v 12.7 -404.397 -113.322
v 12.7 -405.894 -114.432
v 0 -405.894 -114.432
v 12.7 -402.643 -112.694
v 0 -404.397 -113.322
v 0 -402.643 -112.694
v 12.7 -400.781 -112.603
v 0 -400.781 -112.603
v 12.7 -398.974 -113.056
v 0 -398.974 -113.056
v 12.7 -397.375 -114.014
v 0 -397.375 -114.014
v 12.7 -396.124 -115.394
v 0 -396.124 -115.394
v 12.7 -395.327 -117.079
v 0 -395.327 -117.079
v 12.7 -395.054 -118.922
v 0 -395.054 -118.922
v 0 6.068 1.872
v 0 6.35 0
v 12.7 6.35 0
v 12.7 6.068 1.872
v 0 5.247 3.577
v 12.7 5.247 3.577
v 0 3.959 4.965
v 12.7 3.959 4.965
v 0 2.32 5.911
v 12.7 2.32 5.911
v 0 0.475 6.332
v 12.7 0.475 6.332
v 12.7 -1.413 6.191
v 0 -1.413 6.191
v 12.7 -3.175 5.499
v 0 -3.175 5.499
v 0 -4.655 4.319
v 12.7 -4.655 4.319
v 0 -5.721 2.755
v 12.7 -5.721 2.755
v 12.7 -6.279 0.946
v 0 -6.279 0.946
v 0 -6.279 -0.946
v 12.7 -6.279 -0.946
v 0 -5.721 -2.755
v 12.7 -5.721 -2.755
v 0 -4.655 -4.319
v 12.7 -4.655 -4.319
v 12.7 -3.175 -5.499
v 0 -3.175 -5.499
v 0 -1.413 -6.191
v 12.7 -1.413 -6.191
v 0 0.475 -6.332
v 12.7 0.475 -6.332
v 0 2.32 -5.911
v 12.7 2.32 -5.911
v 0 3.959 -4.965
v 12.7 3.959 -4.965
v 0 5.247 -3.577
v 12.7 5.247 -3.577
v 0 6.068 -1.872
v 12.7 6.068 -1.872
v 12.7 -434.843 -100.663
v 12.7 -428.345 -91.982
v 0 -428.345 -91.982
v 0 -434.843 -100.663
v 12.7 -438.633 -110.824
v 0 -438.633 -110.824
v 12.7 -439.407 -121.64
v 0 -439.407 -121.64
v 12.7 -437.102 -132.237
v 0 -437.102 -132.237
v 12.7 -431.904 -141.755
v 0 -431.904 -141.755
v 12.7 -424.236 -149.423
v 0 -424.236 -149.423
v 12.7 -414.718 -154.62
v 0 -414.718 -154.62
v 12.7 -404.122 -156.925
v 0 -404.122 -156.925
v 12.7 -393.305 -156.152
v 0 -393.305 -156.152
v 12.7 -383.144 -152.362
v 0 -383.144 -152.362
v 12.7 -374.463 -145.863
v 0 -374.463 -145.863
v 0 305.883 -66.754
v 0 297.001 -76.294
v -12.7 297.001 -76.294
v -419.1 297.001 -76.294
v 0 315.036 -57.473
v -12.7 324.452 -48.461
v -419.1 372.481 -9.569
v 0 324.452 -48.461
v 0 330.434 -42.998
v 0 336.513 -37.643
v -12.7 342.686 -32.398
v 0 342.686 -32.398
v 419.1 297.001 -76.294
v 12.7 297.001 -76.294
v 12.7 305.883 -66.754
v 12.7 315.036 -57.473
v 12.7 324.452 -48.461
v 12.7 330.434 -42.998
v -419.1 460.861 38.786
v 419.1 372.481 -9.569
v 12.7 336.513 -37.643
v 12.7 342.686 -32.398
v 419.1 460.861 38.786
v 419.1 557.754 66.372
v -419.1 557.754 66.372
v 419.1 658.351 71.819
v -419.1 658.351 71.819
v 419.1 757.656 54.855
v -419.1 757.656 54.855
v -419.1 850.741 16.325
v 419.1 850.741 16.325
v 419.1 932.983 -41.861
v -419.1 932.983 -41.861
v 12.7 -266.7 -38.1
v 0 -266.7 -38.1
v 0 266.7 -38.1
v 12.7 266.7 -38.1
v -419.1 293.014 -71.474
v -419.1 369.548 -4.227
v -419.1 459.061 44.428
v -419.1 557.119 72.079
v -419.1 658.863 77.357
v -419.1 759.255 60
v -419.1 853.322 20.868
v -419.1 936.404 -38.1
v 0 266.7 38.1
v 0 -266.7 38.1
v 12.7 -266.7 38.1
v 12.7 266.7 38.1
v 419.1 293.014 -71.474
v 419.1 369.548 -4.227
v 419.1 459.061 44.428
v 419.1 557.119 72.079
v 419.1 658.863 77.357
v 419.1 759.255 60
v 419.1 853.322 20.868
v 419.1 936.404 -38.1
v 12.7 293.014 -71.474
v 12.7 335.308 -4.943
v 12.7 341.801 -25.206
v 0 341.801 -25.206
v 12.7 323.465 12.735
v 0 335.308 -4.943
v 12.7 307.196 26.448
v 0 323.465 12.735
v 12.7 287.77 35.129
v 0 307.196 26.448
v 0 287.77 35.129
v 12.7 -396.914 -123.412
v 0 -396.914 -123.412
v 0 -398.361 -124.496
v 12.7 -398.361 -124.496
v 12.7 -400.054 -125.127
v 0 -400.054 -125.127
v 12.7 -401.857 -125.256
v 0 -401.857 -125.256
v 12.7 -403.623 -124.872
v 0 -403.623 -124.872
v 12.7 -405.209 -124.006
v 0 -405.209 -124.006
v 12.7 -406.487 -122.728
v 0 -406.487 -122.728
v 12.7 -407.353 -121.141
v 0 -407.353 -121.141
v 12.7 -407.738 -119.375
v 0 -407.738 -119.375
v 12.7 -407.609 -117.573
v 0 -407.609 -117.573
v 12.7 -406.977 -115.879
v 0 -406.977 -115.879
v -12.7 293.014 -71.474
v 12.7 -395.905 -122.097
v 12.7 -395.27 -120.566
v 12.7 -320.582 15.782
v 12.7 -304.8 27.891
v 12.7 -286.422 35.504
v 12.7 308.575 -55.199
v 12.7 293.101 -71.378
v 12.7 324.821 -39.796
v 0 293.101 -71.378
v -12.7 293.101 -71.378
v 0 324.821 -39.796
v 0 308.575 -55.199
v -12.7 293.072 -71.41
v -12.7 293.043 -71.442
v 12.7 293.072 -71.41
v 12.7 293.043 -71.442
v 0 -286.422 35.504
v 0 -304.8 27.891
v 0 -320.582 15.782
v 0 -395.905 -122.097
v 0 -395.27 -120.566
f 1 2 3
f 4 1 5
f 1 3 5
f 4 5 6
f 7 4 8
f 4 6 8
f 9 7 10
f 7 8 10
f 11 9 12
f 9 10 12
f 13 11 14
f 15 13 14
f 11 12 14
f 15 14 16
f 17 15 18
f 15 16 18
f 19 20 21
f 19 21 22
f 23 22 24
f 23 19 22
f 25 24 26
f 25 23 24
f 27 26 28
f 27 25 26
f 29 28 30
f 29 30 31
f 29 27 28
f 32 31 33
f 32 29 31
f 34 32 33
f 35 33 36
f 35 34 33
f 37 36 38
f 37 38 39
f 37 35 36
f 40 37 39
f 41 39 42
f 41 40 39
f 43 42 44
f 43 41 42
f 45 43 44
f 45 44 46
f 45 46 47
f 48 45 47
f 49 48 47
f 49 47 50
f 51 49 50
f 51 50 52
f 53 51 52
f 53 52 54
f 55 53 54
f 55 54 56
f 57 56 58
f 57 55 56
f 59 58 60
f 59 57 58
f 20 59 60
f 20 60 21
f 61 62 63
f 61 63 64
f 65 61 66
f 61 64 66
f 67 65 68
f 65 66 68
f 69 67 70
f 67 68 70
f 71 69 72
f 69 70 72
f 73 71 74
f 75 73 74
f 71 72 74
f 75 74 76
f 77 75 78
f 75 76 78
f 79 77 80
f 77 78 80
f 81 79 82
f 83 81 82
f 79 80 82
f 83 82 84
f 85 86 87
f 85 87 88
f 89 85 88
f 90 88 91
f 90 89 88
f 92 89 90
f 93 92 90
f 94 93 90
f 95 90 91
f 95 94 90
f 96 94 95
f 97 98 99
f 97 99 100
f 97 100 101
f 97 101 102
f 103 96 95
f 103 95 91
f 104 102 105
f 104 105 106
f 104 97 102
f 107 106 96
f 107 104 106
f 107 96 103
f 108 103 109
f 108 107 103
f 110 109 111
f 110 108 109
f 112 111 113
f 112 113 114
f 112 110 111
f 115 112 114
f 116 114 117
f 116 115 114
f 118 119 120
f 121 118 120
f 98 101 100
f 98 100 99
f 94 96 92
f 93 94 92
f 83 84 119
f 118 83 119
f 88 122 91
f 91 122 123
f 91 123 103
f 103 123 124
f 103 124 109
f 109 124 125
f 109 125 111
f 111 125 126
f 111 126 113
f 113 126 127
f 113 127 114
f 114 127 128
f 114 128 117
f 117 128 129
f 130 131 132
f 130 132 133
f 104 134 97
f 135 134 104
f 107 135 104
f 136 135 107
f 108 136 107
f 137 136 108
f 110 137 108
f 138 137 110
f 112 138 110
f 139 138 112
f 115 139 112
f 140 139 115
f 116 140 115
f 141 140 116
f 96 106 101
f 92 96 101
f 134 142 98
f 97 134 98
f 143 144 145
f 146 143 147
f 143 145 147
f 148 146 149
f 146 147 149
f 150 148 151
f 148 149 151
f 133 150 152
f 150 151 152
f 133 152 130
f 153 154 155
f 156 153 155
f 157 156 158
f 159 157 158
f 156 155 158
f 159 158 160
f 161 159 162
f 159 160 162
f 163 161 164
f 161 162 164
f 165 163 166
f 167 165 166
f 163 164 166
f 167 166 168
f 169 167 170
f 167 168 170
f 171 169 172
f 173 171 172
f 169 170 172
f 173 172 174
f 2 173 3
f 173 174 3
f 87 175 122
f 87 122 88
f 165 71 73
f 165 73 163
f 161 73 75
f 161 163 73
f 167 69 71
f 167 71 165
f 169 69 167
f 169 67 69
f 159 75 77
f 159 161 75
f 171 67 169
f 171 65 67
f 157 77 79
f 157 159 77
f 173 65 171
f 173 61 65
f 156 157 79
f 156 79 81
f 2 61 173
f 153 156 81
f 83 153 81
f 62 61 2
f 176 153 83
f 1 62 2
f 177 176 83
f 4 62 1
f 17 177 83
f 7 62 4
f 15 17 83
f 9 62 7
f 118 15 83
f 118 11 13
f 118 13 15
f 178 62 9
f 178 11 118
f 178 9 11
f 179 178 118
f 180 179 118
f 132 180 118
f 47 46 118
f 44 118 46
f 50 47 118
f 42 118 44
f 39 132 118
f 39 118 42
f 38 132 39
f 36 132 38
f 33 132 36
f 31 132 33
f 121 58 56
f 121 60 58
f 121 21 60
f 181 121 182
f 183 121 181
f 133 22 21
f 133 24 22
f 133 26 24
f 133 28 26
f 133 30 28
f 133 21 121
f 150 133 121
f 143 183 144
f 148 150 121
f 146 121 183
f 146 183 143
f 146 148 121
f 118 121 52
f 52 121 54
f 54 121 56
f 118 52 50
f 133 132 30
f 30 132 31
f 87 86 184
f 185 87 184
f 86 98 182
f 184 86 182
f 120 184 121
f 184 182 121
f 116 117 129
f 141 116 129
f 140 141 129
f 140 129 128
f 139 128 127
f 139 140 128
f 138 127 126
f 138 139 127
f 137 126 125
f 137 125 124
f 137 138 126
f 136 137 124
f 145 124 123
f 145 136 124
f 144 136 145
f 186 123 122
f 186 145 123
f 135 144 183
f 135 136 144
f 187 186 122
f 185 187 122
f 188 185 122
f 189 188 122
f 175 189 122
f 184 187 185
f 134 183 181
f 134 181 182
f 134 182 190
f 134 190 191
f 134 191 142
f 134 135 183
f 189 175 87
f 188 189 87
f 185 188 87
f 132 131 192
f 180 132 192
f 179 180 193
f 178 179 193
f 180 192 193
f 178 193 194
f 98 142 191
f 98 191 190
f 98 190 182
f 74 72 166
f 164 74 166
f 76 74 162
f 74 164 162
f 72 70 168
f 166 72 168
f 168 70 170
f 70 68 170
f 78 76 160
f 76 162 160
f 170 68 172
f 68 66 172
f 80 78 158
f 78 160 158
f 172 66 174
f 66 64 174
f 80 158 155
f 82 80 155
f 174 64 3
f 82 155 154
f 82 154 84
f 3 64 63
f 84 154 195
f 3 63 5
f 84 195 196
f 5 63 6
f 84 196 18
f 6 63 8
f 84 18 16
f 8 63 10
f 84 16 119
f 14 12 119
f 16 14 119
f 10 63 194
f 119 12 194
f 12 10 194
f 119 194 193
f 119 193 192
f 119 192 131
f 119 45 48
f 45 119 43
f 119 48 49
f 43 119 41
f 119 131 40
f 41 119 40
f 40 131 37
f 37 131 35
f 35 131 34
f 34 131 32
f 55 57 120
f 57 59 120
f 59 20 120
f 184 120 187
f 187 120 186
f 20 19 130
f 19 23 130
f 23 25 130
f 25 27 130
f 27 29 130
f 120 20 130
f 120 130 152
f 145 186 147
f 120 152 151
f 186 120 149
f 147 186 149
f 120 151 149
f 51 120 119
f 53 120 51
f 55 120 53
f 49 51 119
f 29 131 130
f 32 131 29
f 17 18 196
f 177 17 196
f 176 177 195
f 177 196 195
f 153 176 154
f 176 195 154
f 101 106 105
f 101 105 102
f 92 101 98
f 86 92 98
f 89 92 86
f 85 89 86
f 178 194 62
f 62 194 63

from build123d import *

# Parameters (mm, degrees)
F0_W          = 533.4
F0_H          = 76.2
F0_R          = 6.35
F0_W_2        = 76.2
F0_H_2        = 50.8
F1_DEPTH      = 12.7
F3_DEPTH      = 406.4
F3_DEPTH_BACK = 431.8
F5_DEPTH      = 25.4


with BuildPart() as f1:
    # F0 (on Right) → F1 (new body)
    with BuildSketch(Plane.YZ):
        Rectangle(F0_W, F0_H)
        Circle(F0_R, mode=Mode.SUBTRACT)
        with BuildLine():
            Line((-266.7, -38.1), (-266.7, 38.1))
            ThreePointArc((-266.7, 38.1), (-295.8604775462, 32.2996203774), (-320.5815367264, 15.7815367264))
            Line((-320.5815367264, 15.7815367264), (-266.7, -38.1))
        make_face()
        with BuildLine():
            ThreePointArc((342.9, -38.1), (320.5815367264, 15.7815367264), (266.7, 38.1))
            Line((266.7, 38.1), (266.7, -38.1))
            Line((266.7, -38.1), (342.9, -38.1))
        make_face()
        with BuildLine():
            Line((-374.4630734528, -145.8630734528), (-266.7, -38.1))
            Line((-266.7, -38.1), (-320.5815367264, 15.7815367264))
            Line((-320.5815367264, 15.7815367264), (-428.3446101792, -91.9815367264))
            Line((-428.3446101792, -91.9815367264), (-405.8939698766, -114.4321770291))
            ThreePointArc((-405.8939698766, -114.4321770291), (-398.9738020205, -113.0556700582), (-395.053841816, -118.9223050896))
            ThreePointArc((-395.053841816, -118.9223050896), (-395.5372067846, -121.3523448851), (-396.9137137555, -123.4124331502))
            Line((-396.9137137555, -123.4124331502), (-374.4630734528, -145.8630734528))
        make_face()
        with Locations((304.8, -63.5)):
            Rectangle(F0_W_2, F0_H_2)
        with BuildLine():
            ThreePointArc((-428.3446101792, -91.9815367264), (-428.3446101792, -145.8630734528), (-374.4630734528, -145.8630734528))
            Line((-374.4630734528, -145.8630734528), (-396.9137137555, -123.4124331502))
            ThreePointArc((-396.9137137555, -123.4124331502), (-405.8939698766, -123.4124331502), (-405.8939698766, -114.4321770291))
            Line((-405.8939698766, -114.4321770291), (-428.3446101792, -91.9815367264))
        make_face()
    extrude(amount=F1_DEPTH)

    # F2 (on face) → F3 (join, two sides)
    with BuildSketch(Plane.YZ.offset(12.7)) as f3_sk:
        with BuildLine():
            Line((932.9831600189, -41.8606996536), (936.4036917686, -38.1))
            ThreePointArc((936.4036917686, -38.1), (607.84366322, 77.5570236238), (293.0137515068, -71.4744031429))
            Line((293.0137515068, -71.4744031429), (297.0012426376, -76.2937888503))
            ThreePointArc((297.0012426376, -76.2937888503), (607.900564523, 71.9058559585), (932.9831600189, -41.8606996536))
        make_face()
    extrude(amount=F3_DEPTH)
    extrude(f3_sk.sketch, amount=-F3_DEPTH_BACK)

    # F4 (on face) → F5 (cut)
    with BuildSketch(Plane.YZ.offset(12.7)):
        Polygon((266.7, -88.9), (342.9, -88.9), (347.1251726151, -88.7651666999), (347.1251726151, -30.6838881224), (342.6863394703, -32.397700998), (324.4524045918, -48.4607793352), (297.0012426376, -76.2937888503), (266.7, -38.1), align=None)
    extrude(amount=-F5_DEPTH, mode=Mode.SUBTRACT)


solid = f1.part
